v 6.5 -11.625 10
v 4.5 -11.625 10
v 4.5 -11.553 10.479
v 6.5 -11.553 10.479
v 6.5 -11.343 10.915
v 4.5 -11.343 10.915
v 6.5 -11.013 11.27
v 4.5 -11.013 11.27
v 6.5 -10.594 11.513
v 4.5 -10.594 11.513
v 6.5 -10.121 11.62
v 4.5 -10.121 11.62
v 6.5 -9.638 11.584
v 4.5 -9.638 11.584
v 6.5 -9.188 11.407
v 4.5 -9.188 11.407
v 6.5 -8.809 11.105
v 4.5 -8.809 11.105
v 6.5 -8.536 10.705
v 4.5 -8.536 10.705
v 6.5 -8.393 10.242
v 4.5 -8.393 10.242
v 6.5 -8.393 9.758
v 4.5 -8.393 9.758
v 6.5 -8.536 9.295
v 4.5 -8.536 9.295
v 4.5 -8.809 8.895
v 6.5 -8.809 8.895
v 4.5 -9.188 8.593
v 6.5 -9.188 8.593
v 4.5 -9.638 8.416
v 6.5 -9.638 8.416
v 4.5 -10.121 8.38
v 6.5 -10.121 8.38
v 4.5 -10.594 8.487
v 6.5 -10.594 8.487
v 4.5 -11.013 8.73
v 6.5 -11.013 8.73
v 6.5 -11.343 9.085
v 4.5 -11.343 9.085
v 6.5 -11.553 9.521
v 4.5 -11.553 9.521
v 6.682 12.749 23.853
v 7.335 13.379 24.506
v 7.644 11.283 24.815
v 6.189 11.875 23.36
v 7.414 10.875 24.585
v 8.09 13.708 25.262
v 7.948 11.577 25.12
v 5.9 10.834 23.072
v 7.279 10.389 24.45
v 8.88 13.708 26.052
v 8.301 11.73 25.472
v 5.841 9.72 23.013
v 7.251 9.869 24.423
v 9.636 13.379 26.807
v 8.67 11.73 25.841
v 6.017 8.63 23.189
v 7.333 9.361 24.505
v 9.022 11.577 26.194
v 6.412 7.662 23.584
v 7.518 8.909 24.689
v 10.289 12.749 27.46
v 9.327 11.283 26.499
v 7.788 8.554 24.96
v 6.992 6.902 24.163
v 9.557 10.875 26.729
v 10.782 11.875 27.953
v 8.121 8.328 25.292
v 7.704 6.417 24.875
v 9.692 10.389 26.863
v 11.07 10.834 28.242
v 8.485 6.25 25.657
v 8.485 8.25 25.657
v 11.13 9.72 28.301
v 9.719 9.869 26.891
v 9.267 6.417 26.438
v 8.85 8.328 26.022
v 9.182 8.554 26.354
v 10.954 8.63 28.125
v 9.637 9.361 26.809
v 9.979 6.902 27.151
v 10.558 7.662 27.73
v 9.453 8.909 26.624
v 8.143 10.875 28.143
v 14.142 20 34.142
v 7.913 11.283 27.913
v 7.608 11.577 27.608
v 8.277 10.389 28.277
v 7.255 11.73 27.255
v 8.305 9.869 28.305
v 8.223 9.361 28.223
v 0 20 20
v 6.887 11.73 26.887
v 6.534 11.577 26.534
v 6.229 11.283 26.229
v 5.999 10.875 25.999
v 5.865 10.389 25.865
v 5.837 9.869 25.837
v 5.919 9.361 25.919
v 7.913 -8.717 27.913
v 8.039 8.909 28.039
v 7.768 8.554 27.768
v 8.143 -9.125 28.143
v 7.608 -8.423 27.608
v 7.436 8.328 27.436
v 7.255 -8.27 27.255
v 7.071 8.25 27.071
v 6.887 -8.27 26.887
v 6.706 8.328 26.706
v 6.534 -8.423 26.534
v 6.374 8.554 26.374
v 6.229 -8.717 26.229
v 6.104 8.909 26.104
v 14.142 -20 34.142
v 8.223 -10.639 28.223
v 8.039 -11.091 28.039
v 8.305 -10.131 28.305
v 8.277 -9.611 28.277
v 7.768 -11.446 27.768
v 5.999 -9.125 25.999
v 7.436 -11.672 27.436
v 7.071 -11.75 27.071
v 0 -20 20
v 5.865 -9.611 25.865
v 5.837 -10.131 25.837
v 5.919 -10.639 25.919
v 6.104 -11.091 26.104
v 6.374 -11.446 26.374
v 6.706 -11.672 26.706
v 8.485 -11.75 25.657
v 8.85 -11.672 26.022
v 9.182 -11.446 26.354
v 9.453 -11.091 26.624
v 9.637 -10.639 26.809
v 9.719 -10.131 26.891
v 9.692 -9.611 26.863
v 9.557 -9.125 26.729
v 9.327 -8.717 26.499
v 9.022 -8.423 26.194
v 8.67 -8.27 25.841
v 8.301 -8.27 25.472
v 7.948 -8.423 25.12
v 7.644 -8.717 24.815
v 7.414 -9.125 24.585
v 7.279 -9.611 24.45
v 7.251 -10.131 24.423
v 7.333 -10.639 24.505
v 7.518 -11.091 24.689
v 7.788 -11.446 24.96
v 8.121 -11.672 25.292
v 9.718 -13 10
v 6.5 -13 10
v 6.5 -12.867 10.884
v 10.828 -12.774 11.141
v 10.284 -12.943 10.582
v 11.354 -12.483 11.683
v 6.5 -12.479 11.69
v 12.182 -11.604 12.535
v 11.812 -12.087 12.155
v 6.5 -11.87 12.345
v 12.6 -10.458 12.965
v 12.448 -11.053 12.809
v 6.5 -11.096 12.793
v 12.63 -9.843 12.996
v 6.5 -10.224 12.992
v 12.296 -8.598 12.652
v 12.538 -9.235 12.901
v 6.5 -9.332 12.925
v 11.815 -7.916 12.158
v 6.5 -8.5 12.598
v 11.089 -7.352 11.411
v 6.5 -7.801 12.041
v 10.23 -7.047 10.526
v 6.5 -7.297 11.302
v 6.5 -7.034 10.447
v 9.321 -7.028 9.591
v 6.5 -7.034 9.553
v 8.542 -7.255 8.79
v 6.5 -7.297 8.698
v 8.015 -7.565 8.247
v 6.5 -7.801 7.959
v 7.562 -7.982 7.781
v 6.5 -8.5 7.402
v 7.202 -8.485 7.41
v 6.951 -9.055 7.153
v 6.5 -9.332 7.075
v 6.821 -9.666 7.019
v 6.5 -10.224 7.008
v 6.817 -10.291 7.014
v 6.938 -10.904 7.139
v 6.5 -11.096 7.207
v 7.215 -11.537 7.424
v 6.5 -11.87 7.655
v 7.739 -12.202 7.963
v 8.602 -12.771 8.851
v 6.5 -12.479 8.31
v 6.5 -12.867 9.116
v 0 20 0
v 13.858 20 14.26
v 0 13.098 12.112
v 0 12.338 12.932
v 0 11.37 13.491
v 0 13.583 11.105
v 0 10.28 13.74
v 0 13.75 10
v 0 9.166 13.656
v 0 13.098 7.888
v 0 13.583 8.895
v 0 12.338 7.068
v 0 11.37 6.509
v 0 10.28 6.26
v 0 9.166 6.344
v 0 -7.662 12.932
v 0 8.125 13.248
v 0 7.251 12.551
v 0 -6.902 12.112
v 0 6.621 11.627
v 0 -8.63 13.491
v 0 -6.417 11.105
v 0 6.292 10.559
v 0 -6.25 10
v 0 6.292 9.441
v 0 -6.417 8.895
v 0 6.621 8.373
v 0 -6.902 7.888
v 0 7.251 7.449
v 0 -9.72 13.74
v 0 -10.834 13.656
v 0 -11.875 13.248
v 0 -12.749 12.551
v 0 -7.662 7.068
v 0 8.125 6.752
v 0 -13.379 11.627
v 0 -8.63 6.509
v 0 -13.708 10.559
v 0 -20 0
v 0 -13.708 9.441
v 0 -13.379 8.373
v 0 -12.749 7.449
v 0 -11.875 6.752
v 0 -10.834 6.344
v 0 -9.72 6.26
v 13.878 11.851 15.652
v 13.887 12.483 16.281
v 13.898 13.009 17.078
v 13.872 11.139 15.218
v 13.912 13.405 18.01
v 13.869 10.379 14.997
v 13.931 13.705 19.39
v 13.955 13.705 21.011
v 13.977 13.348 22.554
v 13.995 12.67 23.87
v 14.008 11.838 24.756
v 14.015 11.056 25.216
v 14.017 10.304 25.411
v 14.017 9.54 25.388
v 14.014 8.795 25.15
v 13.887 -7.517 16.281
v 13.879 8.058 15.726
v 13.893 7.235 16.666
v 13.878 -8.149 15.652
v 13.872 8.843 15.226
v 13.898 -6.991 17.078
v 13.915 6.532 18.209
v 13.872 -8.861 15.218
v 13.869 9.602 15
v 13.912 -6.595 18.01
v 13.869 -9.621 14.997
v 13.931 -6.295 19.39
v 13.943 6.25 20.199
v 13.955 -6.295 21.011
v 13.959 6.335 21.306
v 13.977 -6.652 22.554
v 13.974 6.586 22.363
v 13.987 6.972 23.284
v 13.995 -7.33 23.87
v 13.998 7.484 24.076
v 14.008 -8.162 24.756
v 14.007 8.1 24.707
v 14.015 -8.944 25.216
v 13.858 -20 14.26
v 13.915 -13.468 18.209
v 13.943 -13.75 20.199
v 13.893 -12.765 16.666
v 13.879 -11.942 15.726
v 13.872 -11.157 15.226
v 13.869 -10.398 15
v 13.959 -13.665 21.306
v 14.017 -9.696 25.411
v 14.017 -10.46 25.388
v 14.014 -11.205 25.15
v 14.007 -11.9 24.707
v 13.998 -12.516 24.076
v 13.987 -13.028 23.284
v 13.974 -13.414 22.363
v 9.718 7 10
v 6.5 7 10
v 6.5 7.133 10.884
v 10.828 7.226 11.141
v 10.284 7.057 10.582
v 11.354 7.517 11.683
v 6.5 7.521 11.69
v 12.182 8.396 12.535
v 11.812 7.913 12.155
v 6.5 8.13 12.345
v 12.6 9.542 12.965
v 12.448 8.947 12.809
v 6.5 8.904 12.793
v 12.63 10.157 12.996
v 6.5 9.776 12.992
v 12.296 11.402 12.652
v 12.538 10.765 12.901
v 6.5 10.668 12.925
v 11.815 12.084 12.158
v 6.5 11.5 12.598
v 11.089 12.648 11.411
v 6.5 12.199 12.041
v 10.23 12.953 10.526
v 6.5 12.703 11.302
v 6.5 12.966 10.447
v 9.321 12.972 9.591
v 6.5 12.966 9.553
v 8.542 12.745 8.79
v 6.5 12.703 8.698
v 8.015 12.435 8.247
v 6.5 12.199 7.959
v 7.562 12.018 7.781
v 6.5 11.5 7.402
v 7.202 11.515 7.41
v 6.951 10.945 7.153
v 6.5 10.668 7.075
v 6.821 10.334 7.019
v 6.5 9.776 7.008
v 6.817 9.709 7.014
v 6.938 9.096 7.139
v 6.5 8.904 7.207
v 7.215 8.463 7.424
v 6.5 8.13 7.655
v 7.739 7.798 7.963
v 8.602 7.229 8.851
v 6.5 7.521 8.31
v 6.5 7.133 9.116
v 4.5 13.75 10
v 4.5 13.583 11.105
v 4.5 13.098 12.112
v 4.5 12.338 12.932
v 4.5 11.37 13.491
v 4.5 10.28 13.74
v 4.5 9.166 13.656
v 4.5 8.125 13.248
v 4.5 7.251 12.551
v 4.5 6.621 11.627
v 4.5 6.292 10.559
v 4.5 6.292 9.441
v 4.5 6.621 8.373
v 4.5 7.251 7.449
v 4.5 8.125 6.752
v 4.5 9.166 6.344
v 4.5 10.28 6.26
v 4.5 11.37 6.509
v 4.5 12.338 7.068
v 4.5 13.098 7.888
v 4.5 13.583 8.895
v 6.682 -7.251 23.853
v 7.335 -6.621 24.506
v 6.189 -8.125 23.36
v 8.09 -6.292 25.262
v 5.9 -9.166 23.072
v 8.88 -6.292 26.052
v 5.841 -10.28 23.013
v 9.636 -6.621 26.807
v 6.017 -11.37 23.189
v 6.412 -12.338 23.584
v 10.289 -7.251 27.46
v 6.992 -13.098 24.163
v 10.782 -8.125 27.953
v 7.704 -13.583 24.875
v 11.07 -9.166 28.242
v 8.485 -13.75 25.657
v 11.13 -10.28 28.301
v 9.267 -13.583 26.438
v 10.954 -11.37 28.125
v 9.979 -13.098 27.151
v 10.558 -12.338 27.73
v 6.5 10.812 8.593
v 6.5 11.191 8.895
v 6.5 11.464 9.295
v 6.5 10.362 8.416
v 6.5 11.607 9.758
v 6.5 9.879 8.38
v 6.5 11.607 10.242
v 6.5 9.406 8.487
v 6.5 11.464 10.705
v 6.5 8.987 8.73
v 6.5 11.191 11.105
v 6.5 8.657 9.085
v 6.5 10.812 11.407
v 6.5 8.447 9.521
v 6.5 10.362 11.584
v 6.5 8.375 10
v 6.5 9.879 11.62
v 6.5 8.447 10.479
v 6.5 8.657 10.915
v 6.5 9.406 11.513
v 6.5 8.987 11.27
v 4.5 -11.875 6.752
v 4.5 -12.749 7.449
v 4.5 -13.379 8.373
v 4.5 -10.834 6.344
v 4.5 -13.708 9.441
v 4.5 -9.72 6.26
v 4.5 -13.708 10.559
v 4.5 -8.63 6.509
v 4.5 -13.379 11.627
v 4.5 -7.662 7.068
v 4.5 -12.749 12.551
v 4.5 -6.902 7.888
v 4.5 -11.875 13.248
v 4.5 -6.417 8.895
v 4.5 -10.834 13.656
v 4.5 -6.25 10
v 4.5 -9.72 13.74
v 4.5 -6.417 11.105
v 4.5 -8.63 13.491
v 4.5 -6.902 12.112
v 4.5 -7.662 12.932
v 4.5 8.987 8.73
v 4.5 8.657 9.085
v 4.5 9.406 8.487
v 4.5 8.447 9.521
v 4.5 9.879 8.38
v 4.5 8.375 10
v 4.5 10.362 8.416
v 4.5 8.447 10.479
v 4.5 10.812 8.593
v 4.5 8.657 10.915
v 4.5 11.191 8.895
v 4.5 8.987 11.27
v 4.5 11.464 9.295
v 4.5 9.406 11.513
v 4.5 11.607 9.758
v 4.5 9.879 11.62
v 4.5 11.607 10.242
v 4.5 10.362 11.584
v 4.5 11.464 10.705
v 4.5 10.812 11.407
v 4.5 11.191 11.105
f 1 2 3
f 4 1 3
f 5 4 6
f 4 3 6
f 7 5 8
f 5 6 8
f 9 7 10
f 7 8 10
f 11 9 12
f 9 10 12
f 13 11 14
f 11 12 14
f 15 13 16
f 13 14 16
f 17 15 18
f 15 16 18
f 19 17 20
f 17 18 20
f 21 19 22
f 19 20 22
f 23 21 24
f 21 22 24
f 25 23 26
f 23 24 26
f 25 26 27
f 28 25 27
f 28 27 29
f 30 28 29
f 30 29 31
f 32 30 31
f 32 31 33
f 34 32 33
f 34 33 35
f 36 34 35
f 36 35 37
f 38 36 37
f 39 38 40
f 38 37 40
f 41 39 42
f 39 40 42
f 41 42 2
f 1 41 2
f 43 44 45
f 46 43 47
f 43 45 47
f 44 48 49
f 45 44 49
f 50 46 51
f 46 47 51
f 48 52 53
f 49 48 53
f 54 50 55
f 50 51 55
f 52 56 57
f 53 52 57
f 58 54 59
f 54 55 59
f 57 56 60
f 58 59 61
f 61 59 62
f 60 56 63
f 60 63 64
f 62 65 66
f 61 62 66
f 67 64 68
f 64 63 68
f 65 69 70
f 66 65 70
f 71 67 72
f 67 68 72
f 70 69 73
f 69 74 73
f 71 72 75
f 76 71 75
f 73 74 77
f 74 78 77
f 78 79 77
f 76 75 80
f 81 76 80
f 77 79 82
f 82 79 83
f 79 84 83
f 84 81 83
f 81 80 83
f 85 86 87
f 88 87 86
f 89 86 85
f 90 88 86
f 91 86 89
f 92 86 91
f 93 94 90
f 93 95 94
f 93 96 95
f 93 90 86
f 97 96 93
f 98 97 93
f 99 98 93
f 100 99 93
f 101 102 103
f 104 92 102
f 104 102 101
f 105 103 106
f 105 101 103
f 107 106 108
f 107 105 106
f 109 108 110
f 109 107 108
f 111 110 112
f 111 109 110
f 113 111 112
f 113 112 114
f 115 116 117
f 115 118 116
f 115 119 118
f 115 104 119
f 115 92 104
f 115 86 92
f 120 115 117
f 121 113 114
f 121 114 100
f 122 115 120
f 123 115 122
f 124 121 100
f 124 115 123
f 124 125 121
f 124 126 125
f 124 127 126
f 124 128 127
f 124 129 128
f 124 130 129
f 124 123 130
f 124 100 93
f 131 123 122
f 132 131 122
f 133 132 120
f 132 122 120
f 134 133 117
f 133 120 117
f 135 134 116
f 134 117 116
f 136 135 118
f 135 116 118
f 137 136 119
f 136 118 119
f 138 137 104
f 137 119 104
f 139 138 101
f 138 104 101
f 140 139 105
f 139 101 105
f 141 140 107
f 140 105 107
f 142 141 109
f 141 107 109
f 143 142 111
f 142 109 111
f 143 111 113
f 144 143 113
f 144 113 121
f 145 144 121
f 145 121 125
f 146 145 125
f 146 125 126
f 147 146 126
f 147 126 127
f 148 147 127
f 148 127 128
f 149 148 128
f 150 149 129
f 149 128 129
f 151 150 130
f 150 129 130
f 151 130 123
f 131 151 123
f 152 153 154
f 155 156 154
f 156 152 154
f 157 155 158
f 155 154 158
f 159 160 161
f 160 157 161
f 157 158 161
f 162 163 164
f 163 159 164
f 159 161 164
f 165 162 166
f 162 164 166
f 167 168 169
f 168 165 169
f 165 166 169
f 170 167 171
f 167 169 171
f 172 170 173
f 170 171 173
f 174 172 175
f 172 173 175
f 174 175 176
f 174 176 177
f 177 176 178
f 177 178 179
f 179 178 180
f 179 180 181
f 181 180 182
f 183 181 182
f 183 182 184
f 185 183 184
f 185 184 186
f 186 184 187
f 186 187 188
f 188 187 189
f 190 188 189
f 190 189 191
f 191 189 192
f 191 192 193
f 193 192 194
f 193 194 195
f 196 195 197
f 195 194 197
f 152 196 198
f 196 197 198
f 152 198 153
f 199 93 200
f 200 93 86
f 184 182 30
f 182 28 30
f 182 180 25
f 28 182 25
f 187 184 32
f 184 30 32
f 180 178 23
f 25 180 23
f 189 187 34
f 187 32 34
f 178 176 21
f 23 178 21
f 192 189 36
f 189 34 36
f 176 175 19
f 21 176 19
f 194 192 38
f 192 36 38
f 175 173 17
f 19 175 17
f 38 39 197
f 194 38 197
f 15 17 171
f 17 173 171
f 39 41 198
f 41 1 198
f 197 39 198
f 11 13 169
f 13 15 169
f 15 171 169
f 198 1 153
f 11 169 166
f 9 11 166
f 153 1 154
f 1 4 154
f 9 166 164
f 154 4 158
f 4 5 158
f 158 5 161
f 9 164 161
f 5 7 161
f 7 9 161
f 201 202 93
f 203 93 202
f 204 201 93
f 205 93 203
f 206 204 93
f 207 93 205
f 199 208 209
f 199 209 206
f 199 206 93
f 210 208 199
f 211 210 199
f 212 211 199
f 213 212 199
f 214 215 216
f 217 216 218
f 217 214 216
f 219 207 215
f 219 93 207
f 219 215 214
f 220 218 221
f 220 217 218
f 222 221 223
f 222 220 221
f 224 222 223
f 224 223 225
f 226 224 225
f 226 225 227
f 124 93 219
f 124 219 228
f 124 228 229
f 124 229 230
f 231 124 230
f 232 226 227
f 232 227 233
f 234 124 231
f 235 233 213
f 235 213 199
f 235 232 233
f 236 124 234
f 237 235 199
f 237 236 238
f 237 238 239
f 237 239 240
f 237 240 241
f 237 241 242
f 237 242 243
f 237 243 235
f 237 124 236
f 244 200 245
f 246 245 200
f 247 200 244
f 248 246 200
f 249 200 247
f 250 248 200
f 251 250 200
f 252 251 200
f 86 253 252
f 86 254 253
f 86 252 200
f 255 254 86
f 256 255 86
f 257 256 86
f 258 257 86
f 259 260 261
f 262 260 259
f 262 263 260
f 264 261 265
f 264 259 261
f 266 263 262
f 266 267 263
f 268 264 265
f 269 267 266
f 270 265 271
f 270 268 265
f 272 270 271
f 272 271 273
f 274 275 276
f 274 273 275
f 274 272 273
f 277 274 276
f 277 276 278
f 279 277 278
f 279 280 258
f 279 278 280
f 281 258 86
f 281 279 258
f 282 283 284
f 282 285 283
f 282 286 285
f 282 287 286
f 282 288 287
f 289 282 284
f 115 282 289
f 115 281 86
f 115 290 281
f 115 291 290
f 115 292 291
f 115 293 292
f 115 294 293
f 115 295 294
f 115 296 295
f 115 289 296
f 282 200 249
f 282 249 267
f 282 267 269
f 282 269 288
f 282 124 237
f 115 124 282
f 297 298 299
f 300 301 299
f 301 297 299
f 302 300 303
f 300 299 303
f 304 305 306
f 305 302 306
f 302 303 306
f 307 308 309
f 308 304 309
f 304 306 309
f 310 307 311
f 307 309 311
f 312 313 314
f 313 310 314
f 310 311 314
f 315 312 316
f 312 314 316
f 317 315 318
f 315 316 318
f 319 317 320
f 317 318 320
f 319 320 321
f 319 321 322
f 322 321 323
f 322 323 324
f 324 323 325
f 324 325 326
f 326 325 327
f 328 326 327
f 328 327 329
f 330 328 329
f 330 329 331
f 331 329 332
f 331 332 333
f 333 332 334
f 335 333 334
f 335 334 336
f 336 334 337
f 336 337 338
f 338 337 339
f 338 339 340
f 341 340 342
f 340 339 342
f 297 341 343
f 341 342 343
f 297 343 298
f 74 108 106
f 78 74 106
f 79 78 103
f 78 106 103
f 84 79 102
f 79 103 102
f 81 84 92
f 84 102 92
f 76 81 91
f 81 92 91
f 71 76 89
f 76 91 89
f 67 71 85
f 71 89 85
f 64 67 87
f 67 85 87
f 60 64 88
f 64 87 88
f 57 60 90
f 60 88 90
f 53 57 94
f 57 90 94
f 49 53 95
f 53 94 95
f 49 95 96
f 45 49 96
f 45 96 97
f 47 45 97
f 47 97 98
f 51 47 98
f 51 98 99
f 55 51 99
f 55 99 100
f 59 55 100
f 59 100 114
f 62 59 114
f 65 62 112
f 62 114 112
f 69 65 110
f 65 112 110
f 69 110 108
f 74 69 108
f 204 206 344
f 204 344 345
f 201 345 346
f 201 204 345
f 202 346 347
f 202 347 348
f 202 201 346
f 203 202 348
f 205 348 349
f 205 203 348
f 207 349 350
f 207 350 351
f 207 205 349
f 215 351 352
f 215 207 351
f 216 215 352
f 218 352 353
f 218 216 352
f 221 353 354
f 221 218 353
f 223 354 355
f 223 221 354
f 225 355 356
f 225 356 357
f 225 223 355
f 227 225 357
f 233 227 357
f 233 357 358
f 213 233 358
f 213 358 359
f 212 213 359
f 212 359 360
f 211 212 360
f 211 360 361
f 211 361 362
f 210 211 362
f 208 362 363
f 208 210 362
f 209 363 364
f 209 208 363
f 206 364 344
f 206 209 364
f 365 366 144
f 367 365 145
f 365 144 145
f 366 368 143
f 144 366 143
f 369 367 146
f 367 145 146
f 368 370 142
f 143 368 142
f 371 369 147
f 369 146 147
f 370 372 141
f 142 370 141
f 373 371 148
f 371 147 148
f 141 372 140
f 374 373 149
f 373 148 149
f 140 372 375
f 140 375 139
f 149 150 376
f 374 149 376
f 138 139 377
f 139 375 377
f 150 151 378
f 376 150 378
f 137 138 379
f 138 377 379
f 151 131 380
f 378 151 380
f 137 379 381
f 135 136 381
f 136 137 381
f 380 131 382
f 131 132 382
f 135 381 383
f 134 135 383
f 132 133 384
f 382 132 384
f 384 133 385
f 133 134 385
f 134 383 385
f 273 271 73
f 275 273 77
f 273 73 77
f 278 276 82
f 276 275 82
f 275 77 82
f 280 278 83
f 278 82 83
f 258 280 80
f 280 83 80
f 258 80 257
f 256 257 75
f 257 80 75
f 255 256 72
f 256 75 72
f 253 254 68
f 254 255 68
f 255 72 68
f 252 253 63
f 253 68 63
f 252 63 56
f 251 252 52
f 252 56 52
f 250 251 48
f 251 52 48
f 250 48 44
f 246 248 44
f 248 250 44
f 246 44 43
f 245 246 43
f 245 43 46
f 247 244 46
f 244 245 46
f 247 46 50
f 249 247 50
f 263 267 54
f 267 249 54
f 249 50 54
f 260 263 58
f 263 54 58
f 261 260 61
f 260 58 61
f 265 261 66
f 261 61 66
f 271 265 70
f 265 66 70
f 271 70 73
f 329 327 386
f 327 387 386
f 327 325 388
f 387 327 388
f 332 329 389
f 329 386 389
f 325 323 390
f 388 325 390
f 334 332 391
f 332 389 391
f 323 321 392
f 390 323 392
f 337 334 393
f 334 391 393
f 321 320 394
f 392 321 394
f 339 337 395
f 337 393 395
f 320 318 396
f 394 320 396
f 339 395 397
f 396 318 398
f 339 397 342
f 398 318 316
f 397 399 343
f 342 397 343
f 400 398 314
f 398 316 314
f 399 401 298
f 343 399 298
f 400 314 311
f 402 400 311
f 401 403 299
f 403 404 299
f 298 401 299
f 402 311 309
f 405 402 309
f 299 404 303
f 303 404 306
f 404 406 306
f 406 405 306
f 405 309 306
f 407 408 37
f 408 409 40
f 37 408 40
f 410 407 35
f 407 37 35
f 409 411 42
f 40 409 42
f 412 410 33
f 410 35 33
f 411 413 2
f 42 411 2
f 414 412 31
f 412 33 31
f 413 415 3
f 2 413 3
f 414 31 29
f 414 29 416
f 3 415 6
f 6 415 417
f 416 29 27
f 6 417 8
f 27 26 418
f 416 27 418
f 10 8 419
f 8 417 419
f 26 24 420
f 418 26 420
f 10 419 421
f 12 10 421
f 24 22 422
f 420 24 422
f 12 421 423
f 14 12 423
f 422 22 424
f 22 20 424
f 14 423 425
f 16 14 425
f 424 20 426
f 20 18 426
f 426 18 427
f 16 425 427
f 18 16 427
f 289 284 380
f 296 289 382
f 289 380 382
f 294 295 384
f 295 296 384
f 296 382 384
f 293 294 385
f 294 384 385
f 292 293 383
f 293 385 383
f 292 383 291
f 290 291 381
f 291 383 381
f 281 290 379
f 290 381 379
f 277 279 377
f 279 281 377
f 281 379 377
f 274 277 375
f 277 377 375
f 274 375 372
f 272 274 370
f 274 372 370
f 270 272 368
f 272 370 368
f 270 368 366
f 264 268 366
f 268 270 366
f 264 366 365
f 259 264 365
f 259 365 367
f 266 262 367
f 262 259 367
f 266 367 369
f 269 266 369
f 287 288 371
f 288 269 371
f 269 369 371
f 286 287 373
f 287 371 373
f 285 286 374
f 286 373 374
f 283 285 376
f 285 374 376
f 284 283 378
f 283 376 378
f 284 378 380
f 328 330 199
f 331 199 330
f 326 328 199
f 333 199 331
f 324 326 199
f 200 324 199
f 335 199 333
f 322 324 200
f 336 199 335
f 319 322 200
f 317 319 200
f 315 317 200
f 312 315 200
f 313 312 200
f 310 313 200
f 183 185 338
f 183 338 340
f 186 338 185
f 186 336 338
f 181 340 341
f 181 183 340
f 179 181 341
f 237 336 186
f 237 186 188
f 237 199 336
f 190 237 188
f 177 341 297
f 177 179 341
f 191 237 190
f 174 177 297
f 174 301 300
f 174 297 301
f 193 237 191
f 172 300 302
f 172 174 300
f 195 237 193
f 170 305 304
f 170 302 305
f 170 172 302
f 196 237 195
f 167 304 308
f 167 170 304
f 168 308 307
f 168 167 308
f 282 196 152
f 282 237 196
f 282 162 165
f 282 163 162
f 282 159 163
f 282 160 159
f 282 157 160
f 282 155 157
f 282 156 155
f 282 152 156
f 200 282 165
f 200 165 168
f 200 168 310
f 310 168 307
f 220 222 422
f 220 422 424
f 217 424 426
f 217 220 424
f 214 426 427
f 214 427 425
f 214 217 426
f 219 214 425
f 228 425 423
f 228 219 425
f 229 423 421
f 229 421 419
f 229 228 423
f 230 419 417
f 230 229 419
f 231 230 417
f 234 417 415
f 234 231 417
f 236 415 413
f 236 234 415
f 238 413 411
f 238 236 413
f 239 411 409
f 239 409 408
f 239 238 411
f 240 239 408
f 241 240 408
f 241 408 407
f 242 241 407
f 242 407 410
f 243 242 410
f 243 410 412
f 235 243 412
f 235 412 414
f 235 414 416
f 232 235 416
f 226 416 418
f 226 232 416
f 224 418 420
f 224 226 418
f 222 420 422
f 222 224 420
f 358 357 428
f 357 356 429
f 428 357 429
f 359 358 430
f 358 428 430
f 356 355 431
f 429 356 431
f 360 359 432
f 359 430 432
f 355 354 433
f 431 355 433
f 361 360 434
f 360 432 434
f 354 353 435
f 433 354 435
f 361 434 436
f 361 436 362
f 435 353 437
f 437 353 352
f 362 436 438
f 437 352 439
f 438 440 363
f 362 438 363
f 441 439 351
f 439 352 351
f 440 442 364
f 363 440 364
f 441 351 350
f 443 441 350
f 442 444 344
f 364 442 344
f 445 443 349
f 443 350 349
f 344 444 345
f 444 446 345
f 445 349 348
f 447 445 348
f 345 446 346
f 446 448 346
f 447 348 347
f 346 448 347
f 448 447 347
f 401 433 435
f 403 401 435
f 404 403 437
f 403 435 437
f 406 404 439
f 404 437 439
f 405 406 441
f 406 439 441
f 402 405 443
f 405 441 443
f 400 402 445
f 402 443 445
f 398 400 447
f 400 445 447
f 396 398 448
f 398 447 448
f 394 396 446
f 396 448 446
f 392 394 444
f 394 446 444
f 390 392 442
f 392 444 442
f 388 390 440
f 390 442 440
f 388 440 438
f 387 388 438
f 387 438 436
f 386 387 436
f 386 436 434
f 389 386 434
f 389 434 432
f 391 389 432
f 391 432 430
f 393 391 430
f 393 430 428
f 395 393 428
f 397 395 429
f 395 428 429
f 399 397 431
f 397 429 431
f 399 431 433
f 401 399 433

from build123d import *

# Parameters (mm, degrees)
F1_DEPTH  = 20
F2_R      = 3.75
F3_DEPTH  = 4.5
F5_R      = 1.625
F6_DEPTH  = 2
F8_R      = 3
F9_DEPTH  = 7.1339190804
F11_R     = 1.75
F12_DEPTH = 2
F14_R     = 3.75
F15_DEPTH = 12.3627990274


with BuildPart() as f1:
    # F0 (on Front) → F1 (new body, symmetric)
    with BuildSketch(Plane.XZ):
        Polygon((0, 20), (0, 0), (13.8581929877, 14.2597485145), (14.1421356237, 34.1421356237), align=None)
    extrude(amount=F1_DEPTH, both=True)

    # F2 (on Right) → F3 (cut)
    with BuildSketch(Plane.YZ):
        with Locations((10, 10)):
            Circle(F2_R)
        with Locations((-10, 10)):
            Circle(F2_R)
    extrude(amount=F3_DEPTH, mode=Mode.SUBTRACT)

    # F5 (on offset) → F6 (cut)
    with BuildSketch(Plane(origin=(4.5, 0, 0), x_dir=(0, -1, 0), z_dir=(-1, 0, 0))):
        with Locations((-10, 10)):
            Circle(F5_R)
        with Locations((10, 10)):
            Circle(F5_R)
    extrude(amount=-F6_DEPTH, mode=Mode.SUBTRACT)

    # F8 (on offset) → F9 (cut, up to face)
    with BuildSketch(Plane(origin=(6.5, 0, 0), x_dir=(0, -1, 0), z_dir=(-1, 0, 0))):
        with Locations((-10, 10)):
            Circle(F8_R)
        with Locations((10, 10)):
            Circle(F8_R)
    extrude(amount=-F9_DEPTH, mode=Mode.SUBTRACT)

    # F11 (on offset) → F12 (cut)
    with BuildSketch(Plane(origin=(-10, 0, 10), x_dir=(0, -1, 0), z_dir=(-0.7071067812, 0, 0.7071067812))):
        with Locations((-10, 24.1421356237)):
            Circle(F11_R)
        with Locations((10, 24.1421356237)):
            Circle(F11_R)
    extrude(amount=-F12_DEPTH, mode=Mode.SUBTRACT)

    # F14 (on offset) → F15 (cut, up to face)
    with BuildSketch(Plane(origin=(-8.5857864376, 0, 8.5857864376), x_dir=(0, -1, 0), z_dir=(-0.7071067812, 0, 0.7071067812))):
        with Locations((-10, 24.1421356237)):
            Circle(F14_R)
        with Locations((10, 24.1421356237)):
            Circle(F14_R)
    extrude(amount=-F15_DEPTH, mode=Mode.SUBTRACT)


solid = f1.part
